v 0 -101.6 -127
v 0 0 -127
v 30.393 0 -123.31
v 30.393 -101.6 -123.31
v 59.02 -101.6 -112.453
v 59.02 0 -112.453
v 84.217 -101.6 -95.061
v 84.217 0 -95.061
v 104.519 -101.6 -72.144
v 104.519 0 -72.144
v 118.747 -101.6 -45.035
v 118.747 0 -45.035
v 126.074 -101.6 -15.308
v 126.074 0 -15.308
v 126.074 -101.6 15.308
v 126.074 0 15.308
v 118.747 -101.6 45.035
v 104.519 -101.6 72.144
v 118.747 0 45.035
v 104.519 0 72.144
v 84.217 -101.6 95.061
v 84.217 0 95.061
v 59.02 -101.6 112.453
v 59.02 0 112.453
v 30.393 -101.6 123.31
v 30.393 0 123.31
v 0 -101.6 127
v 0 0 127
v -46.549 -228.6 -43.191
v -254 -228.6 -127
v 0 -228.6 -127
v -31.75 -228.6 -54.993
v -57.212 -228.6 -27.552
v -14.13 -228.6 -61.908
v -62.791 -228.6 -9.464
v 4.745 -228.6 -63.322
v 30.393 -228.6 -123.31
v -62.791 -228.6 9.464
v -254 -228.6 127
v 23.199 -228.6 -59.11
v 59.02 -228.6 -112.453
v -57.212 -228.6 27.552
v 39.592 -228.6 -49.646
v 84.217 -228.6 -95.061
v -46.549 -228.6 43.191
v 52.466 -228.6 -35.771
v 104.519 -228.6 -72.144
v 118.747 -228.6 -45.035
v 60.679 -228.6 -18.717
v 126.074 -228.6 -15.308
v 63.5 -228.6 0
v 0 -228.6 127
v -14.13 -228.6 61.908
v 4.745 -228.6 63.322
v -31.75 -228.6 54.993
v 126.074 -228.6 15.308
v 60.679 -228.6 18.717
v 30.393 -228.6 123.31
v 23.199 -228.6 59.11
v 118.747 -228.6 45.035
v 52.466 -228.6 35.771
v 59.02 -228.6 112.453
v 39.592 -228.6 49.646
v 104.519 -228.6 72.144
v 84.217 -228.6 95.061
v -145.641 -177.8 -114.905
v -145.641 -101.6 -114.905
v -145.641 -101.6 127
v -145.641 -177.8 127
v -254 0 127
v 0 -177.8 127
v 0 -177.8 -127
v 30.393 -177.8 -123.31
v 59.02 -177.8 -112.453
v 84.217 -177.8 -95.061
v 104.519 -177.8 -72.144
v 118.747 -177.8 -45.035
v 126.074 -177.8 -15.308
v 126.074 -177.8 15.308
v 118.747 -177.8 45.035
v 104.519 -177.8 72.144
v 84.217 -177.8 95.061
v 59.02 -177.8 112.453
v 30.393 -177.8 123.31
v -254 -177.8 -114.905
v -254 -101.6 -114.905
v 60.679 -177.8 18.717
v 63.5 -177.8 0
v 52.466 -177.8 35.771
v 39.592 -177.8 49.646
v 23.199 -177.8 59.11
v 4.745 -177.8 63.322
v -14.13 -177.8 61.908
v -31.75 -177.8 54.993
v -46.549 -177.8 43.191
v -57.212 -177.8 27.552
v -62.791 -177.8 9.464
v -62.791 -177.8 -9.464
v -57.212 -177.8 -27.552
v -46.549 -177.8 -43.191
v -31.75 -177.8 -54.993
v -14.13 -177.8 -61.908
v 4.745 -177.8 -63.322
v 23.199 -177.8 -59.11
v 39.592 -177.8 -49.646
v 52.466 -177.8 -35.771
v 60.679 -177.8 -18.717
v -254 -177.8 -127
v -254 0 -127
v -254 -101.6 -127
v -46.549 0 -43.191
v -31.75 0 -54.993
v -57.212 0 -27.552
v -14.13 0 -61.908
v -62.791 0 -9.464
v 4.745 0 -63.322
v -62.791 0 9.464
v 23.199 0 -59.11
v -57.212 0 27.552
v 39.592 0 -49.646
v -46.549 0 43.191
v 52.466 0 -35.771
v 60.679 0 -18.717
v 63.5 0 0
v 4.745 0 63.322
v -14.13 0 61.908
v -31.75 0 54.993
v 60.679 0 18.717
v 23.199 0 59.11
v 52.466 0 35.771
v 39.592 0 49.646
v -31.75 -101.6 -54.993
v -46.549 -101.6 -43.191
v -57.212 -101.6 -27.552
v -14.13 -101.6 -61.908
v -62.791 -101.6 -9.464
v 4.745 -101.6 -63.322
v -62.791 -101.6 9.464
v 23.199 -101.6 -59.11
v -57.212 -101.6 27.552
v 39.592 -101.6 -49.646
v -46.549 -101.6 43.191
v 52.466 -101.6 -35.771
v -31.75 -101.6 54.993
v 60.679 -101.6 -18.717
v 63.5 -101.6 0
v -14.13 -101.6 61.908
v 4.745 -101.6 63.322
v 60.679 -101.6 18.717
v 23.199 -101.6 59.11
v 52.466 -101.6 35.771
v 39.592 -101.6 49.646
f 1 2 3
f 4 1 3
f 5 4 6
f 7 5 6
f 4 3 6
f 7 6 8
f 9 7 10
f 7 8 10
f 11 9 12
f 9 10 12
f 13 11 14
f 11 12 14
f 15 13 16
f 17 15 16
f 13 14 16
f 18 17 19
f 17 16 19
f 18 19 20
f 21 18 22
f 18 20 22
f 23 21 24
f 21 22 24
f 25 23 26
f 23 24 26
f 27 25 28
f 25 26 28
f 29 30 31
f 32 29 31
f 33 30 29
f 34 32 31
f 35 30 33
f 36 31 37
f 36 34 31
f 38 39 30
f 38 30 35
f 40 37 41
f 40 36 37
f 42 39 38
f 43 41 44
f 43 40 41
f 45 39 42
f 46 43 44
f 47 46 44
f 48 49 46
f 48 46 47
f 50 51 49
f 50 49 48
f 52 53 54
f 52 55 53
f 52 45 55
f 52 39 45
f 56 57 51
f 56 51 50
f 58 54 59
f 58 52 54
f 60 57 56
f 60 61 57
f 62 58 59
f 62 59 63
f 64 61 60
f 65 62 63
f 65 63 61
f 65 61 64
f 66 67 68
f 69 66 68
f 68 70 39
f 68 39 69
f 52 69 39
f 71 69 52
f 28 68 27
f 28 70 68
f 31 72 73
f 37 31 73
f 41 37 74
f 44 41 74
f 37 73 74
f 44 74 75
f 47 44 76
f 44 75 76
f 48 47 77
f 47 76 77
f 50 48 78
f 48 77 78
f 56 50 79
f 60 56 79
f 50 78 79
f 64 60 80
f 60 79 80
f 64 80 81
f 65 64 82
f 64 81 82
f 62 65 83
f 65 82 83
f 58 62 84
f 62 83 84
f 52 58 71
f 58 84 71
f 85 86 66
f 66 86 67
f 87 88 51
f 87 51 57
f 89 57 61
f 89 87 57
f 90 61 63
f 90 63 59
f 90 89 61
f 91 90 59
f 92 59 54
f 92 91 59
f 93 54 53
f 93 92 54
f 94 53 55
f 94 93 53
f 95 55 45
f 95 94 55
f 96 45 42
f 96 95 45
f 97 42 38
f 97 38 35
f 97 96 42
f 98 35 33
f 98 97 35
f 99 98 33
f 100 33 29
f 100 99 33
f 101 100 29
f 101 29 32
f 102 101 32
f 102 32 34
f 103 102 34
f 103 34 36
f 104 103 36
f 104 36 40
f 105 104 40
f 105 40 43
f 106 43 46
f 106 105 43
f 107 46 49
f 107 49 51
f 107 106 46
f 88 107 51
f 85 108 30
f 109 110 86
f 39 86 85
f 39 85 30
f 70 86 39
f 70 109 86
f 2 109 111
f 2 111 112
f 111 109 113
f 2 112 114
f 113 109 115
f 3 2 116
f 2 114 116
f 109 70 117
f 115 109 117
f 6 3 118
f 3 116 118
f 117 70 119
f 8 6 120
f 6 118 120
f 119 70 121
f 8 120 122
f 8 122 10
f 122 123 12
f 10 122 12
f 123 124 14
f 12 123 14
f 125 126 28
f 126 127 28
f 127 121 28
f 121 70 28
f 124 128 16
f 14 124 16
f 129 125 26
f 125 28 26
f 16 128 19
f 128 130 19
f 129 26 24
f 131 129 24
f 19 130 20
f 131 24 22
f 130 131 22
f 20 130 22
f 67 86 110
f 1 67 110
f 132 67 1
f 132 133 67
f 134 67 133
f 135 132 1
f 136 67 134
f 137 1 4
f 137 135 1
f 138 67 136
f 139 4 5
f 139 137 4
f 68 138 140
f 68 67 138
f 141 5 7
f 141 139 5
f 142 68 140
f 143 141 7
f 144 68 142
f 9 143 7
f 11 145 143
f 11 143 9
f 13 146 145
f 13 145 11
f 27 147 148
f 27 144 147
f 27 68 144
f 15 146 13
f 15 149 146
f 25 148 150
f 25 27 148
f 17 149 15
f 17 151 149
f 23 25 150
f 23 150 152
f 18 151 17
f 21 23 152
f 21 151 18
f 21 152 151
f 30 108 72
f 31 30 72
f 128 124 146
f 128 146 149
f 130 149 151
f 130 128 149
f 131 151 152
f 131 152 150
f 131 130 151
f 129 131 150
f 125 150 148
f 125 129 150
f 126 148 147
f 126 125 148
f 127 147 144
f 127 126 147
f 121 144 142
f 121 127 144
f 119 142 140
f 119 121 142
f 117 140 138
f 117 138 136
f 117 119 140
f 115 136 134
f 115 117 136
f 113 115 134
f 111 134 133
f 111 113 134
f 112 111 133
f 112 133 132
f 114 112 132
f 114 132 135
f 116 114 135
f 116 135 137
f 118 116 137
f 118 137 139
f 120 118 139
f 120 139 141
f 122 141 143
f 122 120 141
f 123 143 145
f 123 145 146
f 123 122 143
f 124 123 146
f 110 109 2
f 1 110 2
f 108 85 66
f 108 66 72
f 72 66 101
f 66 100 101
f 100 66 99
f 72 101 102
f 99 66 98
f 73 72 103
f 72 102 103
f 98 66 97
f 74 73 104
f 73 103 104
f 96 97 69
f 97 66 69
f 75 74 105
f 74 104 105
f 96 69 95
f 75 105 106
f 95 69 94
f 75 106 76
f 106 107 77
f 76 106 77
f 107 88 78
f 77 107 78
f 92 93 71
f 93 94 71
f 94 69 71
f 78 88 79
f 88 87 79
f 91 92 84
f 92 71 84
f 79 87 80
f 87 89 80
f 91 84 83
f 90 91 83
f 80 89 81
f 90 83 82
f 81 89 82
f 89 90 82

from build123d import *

# Parameters (mm, degrees)
F0_R     = 63.5
F1_DEPTH = 101.6
F3_R     = 63.5
F4_DEPTH = 50.8
F5_W     = 108.3593287468
F5_H     = 241.9045526981
F6_DEPTH = 76.2


with BuildPart() as f1:
    # F0 (on Front) → F1 (new body)
    with BuildSketch(Plane.XZ):
        with BuildLine():
            Line((-254, -127), (0, -127))
            ThreePointArc((0, -127), (127, 0), (0, 127))
            Line((0, 127), (-254, 127))
            Line((-254, 127), (-254, -127))
        make_face()
        Circle(F0_R, mode=Mode.SUBTRACT)
    extrude(amount=F1_DEPTH)



with BuildPart() as f4:
    # F3 (on offset) → F4 (new body)
    with BuildSketch(Plane.XZ.offset(177.8)):
        with BuildLine():
            Line((0, 127), (-254, 127))
            Line((-254, 127), (-254, -127))
            Line((-254, -127), (0, -127))
            ThreePointArc((0, -127), (127, 0), (0, 127))
        make_face()
        Circle(F3_R, mode=Mode.SUBTRACT)
    extrude(amount=F4_DEPTH)


with BuildPart() as f1_1:
    add(f1.part)

    add(f4.part)  # F6 merges F4
    # F5 (on face) → F6 (join, through all)
    with BuildSketch(Plane.XZ.offset(101.6)):
        with Locations((-199.8203356266, 6.0477236509)):
            Rectangle(F5_W, F5_H)
    extrude(amount=F6_DEPTH)


solid = f1_1.part
